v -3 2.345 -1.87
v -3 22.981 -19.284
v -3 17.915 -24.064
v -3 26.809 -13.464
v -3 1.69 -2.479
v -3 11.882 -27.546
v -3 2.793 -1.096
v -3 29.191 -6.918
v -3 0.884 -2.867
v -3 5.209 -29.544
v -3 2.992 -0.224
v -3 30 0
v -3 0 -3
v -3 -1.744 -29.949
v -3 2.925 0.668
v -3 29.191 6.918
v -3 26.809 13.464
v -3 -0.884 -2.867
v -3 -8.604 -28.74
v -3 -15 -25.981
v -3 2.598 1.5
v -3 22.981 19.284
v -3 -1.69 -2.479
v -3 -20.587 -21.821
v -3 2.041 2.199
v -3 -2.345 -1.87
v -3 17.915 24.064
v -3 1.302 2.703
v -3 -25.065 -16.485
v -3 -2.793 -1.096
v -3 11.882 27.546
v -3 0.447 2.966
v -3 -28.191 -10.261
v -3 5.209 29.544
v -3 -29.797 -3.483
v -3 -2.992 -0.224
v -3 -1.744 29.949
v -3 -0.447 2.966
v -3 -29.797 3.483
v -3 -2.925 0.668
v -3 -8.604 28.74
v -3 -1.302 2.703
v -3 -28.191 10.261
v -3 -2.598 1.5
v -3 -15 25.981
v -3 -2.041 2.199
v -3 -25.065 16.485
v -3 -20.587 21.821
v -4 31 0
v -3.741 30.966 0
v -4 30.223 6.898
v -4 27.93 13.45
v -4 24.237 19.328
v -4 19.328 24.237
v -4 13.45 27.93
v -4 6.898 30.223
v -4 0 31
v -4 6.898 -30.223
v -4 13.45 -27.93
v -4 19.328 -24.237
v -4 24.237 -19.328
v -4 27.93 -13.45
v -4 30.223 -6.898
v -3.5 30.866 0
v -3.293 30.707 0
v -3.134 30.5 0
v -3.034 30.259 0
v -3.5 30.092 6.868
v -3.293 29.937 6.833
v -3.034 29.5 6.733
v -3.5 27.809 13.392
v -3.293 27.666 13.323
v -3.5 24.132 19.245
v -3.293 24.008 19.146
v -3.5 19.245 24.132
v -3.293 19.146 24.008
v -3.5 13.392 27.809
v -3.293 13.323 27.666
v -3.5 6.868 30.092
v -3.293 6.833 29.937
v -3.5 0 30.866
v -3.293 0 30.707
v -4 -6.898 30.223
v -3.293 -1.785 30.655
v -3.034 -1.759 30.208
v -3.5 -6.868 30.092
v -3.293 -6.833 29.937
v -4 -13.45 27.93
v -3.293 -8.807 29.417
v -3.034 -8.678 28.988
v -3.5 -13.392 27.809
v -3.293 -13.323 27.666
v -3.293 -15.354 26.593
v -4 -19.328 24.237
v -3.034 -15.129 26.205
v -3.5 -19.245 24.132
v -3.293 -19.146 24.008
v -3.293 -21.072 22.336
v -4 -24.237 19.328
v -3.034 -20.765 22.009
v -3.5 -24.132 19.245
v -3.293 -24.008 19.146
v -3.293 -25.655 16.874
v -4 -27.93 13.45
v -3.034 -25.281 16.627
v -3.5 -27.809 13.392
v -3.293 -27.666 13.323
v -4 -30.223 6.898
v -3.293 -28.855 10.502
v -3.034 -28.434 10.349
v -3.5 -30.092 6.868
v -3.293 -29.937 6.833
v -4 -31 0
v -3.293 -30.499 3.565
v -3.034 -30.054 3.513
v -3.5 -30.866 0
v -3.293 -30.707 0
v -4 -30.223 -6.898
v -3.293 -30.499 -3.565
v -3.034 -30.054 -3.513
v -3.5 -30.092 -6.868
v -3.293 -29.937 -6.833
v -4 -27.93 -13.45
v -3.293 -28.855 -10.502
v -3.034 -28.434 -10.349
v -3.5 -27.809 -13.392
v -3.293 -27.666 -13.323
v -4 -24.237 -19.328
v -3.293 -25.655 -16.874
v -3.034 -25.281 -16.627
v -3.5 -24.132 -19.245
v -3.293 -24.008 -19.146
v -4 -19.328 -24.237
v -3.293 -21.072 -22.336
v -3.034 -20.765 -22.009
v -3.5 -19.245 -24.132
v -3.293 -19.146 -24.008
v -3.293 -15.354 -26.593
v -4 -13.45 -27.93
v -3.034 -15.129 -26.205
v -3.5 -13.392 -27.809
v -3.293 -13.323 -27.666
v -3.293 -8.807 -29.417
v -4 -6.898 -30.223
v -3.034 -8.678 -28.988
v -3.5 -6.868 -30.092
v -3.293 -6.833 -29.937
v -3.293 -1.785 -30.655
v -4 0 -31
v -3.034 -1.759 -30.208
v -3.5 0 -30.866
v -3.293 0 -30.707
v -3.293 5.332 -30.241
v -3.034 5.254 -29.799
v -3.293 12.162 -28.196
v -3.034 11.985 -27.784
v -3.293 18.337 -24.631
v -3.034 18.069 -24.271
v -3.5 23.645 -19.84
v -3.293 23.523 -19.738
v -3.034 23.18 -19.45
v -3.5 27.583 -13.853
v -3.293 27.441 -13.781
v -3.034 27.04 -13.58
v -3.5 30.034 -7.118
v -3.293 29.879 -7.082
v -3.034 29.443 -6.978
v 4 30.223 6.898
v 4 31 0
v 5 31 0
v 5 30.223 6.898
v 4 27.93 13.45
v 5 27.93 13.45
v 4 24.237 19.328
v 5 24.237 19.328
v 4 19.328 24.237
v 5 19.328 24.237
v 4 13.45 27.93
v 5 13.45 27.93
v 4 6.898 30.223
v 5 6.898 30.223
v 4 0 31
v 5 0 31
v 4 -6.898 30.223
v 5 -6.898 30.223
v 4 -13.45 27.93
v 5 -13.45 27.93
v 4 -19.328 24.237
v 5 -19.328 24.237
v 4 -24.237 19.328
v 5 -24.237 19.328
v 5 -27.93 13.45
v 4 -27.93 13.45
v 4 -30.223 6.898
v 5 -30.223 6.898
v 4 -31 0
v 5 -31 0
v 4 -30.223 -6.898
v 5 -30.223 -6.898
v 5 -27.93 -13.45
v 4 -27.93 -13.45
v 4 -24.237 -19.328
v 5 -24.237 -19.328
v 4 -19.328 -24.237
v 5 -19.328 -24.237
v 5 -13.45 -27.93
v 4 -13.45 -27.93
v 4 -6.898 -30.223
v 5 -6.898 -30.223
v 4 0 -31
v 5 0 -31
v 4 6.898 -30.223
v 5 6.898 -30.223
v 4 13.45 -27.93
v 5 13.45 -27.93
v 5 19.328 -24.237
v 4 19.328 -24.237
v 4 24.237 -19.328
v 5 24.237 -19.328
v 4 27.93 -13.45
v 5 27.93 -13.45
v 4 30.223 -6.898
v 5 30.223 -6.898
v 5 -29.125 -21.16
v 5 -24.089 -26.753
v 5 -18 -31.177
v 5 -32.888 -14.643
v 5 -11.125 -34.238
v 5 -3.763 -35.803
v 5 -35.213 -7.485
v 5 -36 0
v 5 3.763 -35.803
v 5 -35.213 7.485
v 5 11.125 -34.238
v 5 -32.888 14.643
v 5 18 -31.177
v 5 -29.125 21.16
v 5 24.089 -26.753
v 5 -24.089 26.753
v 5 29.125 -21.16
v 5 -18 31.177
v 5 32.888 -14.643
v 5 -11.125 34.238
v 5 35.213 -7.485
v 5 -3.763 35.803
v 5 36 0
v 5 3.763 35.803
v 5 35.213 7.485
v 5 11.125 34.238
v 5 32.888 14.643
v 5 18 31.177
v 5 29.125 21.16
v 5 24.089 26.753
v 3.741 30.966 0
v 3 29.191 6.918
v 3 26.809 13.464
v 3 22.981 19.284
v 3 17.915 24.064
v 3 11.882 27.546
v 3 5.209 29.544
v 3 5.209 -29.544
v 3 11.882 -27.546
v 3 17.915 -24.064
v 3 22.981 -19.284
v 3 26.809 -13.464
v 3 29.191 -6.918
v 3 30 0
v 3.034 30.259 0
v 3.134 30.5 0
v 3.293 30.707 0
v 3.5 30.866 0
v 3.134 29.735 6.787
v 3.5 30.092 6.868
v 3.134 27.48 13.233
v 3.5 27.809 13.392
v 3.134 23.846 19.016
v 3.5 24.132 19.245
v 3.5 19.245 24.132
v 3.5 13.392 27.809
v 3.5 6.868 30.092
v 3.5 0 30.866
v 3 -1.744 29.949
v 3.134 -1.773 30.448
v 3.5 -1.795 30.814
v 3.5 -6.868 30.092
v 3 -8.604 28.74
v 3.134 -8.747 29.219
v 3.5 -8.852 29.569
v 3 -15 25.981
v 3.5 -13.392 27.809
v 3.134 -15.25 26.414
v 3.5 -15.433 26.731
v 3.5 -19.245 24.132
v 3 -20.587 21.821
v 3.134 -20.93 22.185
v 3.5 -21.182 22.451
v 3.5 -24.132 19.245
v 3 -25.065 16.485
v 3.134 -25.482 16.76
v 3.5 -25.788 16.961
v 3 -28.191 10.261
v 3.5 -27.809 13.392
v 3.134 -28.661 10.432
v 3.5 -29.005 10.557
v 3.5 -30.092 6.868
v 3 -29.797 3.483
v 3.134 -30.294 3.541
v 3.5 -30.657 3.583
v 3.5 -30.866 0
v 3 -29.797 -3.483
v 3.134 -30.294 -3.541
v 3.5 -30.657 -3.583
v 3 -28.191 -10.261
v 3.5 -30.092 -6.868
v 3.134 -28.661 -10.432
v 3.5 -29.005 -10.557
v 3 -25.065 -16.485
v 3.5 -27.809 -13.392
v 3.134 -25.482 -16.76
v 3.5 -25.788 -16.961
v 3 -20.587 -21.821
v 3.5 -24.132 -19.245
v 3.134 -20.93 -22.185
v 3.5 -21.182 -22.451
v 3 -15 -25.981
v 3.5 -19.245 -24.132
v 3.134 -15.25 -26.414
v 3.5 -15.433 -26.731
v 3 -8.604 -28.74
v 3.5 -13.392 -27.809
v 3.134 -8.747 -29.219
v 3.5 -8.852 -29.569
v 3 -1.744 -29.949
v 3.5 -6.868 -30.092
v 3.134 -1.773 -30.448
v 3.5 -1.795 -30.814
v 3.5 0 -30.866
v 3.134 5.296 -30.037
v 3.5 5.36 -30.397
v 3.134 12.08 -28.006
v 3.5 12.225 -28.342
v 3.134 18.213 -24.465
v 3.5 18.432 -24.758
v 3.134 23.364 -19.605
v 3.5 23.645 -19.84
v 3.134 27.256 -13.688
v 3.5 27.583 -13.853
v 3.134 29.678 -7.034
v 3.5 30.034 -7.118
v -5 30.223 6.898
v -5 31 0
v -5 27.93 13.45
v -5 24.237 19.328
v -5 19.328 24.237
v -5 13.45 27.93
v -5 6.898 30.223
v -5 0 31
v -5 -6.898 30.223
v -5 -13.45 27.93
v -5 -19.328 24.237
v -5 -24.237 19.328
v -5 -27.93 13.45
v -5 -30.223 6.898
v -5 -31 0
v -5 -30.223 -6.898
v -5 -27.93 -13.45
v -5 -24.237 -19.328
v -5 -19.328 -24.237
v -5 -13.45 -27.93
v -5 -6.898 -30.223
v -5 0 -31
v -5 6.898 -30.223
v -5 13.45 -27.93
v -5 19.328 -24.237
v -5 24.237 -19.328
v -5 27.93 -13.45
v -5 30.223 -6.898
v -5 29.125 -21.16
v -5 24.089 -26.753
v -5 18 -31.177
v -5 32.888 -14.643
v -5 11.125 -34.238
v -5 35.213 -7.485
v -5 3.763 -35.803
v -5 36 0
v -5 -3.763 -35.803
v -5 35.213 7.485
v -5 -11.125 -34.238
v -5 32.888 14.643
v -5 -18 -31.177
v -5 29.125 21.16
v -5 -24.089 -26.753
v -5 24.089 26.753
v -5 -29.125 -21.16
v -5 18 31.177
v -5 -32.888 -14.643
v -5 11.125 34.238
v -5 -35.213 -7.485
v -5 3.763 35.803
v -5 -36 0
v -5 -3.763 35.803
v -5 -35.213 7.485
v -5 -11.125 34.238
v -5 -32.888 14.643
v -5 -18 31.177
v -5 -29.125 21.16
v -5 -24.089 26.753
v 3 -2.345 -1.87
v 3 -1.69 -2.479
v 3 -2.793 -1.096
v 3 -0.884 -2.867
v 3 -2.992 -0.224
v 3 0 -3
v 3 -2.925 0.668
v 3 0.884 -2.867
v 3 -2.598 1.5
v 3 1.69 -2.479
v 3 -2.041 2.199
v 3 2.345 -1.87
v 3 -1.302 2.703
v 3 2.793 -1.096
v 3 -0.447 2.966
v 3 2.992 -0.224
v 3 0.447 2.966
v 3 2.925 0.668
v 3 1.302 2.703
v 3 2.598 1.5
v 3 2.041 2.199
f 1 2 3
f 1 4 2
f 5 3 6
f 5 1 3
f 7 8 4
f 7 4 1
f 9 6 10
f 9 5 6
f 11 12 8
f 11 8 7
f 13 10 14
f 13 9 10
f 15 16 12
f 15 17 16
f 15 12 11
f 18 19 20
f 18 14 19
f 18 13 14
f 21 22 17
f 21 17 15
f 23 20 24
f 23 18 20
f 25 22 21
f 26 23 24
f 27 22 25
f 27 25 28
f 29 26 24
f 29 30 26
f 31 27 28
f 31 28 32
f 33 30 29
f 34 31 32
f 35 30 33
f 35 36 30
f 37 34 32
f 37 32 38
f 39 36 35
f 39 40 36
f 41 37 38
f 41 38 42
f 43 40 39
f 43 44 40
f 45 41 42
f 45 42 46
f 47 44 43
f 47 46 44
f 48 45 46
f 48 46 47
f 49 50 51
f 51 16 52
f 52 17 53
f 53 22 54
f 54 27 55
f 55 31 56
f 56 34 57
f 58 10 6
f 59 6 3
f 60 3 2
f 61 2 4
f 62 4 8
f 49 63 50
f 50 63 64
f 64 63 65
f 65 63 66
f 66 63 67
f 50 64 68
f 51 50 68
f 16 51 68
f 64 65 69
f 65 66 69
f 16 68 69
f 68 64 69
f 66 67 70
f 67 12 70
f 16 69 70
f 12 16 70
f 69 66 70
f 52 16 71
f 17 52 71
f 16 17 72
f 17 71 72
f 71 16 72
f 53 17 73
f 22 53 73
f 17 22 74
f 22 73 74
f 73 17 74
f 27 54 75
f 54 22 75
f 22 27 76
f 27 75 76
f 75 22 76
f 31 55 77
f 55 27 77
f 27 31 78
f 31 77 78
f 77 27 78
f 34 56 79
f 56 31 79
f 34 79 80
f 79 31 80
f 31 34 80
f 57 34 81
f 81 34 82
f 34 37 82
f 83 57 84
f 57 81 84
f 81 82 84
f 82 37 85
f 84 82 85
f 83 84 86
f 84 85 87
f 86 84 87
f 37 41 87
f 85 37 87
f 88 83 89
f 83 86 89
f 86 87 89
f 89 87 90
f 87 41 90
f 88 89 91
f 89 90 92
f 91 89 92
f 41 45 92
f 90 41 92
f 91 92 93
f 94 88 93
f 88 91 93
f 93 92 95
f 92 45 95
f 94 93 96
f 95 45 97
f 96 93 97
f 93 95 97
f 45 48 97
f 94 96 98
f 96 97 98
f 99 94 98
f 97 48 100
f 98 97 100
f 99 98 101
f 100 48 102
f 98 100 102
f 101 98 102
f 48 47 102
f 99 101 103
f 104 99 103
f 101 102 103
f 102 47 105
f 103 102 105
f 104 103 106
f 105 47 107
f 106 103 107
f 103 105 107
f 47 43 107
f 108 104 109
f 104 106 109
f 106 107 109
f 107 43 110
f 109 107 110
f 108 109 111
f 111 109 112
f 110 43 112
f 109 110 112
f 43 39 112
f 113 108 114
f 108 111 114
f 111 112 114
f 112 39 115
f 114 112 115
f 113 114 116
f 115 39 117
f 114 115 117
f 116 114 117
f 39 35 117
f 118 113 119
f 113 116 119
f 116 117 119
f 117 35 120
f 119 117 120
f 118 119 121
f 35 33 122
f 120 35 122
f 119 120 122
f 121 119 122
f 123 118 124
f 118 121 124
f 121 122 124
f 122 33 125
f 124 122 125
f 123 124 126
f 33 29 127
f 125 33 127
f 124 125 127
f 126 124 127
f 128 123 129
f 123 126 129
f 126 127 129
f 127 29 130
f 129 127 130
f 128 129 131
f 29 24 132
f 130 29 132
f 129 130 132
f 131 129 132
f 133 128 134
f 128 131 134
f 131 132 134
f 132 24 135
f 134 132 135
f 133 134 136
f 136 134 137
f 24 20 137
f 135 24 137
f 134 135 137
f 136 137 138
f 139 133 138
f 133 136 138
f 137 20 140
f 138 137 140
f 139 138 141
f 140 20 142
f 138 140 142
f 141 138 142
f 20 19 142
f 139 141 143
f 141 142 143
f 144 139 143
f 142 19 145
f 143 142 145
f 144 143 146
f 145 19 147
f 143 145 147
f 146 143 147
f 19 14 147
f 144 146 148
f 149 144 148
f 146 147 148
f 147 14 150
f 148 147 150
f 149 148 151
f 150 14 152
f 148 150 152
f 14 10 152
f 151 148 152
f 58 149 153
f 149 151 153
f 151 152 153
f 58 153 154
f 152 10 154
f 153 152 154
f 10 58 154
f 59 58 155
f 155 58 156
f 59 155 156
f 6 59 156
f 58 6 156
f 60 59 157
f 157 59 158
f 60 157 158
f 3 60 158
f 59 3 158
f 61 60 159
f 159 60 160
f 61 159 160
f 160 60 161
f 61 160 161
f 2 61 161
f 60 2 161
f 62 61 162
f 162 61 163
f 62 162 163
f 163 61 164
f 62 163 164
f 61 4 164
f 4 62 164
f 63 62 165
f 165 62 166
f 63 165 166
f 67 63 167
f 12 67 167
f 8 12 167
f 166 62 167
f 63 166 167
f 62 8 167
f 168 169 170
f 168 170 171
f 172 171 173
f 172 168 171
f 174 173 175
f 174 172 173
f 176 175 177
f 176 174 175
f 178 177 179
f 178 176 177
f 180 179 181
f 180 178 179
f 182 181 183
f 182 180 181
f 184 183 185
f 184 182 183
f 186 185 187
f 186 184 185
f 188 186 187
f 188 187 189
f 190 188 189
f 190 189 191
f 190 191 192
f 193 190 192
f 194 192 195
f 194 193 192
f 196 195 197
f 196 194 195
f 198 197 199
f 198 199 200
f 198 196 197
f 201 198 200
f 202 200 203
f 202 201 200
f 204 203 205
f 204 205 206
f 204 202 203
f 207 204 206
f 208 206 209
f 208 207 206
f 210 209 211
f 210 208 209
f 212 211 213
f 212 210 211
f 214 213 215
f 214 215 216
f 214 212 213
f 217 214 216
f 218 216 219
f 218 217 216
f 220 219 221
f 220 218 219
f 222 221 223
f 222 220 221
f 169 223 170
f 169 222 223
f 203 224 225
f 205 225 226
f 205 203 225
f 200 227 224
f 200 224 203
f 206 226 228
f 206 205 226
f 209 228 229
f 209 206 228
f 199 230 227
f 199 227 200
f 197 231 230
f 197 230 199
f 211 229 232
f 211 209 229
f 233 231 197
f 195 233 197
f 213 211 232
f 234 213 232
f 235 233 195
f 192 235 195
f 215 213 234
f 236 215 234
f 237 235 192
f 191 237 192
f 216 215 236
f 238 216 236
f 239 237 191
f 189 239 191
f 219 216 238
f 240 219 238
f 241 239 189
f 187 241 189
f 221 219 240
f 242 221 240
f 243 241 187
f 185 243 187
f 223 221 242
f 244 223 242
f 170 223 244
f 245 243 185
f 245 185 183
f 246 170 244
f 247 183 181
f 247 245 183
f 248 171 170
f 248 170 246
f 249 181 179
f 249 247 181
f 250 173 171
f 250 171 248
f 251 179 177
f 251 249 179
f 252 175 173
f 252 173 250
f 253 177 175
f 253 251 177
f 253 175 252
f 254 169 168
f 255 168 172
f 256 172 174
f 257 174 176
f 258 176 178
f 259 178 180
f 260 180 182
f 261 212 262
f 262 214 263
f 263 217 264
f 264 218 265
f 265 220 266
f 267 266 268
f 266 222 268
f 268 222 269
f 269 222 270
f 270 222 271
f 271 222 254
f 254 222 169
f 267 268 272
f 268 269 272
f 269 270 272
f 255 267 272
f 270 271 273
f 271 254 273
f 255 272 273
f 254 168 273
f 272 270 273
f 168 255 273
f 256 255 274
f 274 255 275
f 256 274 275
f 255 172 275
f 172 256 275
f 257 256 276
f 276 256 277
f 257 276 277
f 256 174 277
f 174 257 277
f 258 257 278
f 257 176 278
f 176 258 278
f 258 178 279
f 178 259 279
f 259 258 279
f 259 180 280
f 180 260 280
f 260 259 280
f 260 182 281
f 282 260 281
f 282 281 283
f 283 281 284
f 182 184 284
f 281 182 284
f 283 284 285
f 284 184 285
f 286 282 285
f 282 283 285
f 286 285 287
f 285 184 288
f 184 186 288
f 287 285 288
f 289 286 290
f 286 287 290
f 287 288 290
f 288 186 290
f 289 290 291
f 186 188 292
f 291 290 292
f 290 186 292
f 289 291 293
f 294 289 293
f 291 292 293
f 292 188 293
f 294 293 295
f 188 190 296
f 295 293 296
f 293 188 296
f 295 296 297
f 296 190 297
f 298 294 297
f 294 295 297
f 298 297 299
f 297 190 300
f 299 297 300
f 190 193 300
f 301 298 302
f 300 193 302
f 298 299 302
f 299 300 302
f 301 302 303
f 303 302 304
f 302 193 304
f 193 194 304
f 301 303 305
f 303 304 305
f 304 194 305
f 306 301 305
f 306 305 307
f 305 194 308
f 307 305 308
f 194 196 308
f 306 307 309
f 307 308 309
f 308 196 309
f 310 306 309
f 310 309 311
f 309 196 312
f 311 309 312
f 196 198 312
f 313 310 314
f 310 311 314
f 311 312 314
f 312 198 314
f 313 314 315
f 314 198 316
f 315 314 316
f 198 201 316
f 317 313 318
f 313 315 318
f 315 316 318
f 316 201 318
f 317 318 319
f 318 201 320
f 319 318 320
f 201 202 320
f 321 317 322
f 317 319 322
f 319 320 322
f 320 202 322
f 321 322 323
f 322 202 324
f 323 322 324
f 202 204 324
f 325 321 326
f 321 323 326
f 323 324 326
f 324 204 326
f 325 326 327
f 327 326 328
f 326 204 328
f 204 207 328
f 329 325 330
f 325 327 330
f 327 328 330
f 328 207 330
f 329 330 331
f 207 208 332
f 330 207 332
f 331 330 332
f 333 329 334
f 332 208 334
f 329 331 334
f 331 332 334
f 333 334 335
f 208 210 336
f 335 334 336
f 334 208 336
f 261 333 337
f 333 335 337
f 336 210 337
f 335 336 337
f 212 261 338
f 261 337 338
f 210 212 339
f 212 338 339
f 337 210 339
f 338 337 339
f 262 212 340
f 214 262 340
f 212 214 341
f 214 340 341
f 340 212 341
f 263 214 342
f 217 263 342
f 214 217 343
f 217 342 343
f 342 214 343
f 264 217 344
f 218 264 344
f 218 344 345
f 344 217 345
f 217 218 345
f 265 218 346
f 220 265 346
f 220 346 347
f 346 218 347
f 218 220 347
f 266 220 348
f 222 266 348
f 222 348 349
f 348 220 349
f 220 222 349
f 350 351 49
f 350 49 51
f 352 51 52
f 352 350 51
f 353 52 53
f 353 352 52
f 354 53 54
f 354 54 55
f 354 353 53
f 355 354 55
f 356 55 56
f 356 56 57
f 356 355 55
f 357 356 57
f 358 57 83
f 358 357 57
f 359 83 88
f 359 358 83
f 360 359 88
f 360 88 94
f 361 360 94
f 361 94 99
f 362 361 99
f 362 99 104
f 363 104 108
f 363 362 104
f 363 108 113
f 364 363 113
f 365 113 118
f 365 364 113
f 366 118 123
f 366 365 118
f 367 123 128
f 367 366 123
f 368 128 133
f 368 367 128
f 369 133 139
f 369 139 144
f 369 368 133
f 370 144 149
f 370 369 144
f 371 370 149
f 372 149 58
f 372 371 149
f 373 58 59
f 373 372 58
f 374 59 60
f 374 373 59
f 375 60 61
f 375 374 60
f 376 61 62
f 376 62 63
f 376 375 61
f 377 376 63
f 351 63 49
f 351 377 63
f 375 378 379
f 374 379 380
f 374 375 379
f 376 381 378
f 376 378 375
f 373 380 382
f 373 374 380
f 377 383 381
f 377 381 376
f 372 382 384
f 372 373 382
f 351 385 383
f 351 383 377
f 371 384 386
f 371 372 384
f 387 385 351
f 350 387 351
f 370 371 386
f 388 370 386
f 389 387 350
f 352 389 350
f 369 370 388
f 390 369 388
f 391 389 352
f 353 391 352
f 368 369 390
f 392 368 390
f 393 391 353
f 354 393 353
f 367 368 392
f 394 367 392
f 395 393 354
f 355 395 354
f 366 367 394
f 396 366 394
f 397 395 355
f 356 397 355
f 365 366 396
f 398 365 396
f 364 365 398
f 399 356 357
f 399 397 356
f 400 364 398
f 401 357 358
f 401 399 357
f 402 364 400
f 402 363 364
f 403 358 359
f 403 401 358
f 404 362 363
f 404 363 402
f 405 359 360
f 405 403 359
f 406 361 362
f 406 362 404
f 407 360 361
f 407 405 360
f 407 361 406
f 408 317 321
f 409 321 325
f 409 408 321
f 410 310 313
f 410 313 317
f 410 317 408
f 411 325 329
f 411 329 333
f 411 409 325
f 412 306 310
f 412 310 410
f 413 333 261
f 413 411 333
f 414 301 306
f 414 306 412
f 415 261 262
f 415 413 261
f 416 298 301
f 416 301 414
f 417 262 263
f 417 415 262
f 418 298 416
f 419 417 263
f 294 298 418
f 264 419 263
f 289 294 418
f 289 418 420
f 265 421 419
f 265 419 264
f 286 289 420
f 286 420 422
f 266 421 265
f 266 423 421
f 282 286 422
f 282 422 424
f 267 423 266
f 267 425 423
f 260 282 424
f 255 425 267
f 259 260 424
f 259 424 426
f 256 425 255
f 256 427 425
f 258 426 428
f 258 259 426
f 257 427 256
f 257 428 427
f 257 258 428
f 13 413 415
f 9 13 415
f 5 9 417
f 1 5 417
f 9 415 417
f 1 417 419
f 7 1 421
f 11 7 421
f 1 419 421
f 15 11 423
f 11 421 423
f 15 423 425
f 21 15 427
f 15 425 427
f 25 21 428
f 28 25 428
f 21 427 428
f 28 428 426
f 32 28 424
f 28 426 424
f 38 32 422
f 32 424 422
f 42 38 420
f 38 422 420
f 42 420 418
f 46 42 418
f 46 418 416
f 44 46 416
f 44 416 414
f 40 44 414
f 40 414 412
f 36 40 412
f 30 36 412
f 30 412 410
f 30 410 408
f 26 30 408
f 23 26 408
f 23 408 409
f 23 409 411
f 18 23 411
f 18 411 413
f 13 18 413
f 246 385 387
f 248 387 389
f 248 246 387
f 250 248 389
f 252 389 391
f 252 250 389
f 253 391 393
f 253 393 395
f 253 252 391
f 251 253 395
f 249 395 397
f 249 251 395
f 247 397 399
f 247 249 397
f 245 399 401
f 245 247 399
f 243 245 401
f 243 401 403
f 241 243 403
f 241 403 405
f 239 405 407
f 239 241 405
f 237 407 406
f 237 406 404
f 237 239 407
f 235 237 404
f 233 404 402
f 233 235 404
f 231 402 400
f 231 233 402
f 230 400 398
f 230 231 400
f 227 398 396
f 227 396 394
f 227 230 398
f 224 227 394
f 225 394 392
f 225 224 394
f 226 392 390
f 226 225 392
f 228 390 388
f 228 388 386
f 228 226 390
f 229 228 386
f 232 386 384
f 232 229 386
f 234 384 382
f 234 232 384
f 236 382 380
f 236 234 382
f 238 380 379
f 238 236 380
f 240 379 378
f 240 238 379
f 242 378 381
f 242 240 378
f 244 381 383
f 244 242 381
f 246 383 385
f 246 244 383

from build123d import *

# Parameters (mm, degrees)
ESQUISSE2_R             = 3
ENL_V_MAT_EXTRU_2_DEPTH = 9
CONG_1_R                = 1


with BuildPart() as part:
    # Esquisse1 → Révolution1 (revolve)
    with BuildSketch(Plane.XY):
        Polygon((-3, 31), (-5, 31), (-5, 36), (5, 36), (5, 31), (3, 31), (3, 0), (-3, 0), align=None)
    revolve(axis=Axis((-3, 0, 0), (1, 0, 0)))

    # Esquisse2 → Enlèv. mat.-Extru.2 (cut, through all)
    with BuildSketch(Plane(origin=(3, 0, 0), x_dir=(0, 0, -1), z_dir=(1, 0, 0))):
        Circle(ESQUISSE2_R)
    extrude(amount=-ENL_V_MAT_EXTRU_2_DEPTH, mode=Mode.SUBTRACT)

    # Congé1
    cong_1_edges = [part.edges().sort_by_distance(p)[0] for p in [
        (-3, -31, 0),
        (3, -31, 0),
    ]]
    fillet(cong_1_edges, radius=CONG_1_R)


solid = part.part
